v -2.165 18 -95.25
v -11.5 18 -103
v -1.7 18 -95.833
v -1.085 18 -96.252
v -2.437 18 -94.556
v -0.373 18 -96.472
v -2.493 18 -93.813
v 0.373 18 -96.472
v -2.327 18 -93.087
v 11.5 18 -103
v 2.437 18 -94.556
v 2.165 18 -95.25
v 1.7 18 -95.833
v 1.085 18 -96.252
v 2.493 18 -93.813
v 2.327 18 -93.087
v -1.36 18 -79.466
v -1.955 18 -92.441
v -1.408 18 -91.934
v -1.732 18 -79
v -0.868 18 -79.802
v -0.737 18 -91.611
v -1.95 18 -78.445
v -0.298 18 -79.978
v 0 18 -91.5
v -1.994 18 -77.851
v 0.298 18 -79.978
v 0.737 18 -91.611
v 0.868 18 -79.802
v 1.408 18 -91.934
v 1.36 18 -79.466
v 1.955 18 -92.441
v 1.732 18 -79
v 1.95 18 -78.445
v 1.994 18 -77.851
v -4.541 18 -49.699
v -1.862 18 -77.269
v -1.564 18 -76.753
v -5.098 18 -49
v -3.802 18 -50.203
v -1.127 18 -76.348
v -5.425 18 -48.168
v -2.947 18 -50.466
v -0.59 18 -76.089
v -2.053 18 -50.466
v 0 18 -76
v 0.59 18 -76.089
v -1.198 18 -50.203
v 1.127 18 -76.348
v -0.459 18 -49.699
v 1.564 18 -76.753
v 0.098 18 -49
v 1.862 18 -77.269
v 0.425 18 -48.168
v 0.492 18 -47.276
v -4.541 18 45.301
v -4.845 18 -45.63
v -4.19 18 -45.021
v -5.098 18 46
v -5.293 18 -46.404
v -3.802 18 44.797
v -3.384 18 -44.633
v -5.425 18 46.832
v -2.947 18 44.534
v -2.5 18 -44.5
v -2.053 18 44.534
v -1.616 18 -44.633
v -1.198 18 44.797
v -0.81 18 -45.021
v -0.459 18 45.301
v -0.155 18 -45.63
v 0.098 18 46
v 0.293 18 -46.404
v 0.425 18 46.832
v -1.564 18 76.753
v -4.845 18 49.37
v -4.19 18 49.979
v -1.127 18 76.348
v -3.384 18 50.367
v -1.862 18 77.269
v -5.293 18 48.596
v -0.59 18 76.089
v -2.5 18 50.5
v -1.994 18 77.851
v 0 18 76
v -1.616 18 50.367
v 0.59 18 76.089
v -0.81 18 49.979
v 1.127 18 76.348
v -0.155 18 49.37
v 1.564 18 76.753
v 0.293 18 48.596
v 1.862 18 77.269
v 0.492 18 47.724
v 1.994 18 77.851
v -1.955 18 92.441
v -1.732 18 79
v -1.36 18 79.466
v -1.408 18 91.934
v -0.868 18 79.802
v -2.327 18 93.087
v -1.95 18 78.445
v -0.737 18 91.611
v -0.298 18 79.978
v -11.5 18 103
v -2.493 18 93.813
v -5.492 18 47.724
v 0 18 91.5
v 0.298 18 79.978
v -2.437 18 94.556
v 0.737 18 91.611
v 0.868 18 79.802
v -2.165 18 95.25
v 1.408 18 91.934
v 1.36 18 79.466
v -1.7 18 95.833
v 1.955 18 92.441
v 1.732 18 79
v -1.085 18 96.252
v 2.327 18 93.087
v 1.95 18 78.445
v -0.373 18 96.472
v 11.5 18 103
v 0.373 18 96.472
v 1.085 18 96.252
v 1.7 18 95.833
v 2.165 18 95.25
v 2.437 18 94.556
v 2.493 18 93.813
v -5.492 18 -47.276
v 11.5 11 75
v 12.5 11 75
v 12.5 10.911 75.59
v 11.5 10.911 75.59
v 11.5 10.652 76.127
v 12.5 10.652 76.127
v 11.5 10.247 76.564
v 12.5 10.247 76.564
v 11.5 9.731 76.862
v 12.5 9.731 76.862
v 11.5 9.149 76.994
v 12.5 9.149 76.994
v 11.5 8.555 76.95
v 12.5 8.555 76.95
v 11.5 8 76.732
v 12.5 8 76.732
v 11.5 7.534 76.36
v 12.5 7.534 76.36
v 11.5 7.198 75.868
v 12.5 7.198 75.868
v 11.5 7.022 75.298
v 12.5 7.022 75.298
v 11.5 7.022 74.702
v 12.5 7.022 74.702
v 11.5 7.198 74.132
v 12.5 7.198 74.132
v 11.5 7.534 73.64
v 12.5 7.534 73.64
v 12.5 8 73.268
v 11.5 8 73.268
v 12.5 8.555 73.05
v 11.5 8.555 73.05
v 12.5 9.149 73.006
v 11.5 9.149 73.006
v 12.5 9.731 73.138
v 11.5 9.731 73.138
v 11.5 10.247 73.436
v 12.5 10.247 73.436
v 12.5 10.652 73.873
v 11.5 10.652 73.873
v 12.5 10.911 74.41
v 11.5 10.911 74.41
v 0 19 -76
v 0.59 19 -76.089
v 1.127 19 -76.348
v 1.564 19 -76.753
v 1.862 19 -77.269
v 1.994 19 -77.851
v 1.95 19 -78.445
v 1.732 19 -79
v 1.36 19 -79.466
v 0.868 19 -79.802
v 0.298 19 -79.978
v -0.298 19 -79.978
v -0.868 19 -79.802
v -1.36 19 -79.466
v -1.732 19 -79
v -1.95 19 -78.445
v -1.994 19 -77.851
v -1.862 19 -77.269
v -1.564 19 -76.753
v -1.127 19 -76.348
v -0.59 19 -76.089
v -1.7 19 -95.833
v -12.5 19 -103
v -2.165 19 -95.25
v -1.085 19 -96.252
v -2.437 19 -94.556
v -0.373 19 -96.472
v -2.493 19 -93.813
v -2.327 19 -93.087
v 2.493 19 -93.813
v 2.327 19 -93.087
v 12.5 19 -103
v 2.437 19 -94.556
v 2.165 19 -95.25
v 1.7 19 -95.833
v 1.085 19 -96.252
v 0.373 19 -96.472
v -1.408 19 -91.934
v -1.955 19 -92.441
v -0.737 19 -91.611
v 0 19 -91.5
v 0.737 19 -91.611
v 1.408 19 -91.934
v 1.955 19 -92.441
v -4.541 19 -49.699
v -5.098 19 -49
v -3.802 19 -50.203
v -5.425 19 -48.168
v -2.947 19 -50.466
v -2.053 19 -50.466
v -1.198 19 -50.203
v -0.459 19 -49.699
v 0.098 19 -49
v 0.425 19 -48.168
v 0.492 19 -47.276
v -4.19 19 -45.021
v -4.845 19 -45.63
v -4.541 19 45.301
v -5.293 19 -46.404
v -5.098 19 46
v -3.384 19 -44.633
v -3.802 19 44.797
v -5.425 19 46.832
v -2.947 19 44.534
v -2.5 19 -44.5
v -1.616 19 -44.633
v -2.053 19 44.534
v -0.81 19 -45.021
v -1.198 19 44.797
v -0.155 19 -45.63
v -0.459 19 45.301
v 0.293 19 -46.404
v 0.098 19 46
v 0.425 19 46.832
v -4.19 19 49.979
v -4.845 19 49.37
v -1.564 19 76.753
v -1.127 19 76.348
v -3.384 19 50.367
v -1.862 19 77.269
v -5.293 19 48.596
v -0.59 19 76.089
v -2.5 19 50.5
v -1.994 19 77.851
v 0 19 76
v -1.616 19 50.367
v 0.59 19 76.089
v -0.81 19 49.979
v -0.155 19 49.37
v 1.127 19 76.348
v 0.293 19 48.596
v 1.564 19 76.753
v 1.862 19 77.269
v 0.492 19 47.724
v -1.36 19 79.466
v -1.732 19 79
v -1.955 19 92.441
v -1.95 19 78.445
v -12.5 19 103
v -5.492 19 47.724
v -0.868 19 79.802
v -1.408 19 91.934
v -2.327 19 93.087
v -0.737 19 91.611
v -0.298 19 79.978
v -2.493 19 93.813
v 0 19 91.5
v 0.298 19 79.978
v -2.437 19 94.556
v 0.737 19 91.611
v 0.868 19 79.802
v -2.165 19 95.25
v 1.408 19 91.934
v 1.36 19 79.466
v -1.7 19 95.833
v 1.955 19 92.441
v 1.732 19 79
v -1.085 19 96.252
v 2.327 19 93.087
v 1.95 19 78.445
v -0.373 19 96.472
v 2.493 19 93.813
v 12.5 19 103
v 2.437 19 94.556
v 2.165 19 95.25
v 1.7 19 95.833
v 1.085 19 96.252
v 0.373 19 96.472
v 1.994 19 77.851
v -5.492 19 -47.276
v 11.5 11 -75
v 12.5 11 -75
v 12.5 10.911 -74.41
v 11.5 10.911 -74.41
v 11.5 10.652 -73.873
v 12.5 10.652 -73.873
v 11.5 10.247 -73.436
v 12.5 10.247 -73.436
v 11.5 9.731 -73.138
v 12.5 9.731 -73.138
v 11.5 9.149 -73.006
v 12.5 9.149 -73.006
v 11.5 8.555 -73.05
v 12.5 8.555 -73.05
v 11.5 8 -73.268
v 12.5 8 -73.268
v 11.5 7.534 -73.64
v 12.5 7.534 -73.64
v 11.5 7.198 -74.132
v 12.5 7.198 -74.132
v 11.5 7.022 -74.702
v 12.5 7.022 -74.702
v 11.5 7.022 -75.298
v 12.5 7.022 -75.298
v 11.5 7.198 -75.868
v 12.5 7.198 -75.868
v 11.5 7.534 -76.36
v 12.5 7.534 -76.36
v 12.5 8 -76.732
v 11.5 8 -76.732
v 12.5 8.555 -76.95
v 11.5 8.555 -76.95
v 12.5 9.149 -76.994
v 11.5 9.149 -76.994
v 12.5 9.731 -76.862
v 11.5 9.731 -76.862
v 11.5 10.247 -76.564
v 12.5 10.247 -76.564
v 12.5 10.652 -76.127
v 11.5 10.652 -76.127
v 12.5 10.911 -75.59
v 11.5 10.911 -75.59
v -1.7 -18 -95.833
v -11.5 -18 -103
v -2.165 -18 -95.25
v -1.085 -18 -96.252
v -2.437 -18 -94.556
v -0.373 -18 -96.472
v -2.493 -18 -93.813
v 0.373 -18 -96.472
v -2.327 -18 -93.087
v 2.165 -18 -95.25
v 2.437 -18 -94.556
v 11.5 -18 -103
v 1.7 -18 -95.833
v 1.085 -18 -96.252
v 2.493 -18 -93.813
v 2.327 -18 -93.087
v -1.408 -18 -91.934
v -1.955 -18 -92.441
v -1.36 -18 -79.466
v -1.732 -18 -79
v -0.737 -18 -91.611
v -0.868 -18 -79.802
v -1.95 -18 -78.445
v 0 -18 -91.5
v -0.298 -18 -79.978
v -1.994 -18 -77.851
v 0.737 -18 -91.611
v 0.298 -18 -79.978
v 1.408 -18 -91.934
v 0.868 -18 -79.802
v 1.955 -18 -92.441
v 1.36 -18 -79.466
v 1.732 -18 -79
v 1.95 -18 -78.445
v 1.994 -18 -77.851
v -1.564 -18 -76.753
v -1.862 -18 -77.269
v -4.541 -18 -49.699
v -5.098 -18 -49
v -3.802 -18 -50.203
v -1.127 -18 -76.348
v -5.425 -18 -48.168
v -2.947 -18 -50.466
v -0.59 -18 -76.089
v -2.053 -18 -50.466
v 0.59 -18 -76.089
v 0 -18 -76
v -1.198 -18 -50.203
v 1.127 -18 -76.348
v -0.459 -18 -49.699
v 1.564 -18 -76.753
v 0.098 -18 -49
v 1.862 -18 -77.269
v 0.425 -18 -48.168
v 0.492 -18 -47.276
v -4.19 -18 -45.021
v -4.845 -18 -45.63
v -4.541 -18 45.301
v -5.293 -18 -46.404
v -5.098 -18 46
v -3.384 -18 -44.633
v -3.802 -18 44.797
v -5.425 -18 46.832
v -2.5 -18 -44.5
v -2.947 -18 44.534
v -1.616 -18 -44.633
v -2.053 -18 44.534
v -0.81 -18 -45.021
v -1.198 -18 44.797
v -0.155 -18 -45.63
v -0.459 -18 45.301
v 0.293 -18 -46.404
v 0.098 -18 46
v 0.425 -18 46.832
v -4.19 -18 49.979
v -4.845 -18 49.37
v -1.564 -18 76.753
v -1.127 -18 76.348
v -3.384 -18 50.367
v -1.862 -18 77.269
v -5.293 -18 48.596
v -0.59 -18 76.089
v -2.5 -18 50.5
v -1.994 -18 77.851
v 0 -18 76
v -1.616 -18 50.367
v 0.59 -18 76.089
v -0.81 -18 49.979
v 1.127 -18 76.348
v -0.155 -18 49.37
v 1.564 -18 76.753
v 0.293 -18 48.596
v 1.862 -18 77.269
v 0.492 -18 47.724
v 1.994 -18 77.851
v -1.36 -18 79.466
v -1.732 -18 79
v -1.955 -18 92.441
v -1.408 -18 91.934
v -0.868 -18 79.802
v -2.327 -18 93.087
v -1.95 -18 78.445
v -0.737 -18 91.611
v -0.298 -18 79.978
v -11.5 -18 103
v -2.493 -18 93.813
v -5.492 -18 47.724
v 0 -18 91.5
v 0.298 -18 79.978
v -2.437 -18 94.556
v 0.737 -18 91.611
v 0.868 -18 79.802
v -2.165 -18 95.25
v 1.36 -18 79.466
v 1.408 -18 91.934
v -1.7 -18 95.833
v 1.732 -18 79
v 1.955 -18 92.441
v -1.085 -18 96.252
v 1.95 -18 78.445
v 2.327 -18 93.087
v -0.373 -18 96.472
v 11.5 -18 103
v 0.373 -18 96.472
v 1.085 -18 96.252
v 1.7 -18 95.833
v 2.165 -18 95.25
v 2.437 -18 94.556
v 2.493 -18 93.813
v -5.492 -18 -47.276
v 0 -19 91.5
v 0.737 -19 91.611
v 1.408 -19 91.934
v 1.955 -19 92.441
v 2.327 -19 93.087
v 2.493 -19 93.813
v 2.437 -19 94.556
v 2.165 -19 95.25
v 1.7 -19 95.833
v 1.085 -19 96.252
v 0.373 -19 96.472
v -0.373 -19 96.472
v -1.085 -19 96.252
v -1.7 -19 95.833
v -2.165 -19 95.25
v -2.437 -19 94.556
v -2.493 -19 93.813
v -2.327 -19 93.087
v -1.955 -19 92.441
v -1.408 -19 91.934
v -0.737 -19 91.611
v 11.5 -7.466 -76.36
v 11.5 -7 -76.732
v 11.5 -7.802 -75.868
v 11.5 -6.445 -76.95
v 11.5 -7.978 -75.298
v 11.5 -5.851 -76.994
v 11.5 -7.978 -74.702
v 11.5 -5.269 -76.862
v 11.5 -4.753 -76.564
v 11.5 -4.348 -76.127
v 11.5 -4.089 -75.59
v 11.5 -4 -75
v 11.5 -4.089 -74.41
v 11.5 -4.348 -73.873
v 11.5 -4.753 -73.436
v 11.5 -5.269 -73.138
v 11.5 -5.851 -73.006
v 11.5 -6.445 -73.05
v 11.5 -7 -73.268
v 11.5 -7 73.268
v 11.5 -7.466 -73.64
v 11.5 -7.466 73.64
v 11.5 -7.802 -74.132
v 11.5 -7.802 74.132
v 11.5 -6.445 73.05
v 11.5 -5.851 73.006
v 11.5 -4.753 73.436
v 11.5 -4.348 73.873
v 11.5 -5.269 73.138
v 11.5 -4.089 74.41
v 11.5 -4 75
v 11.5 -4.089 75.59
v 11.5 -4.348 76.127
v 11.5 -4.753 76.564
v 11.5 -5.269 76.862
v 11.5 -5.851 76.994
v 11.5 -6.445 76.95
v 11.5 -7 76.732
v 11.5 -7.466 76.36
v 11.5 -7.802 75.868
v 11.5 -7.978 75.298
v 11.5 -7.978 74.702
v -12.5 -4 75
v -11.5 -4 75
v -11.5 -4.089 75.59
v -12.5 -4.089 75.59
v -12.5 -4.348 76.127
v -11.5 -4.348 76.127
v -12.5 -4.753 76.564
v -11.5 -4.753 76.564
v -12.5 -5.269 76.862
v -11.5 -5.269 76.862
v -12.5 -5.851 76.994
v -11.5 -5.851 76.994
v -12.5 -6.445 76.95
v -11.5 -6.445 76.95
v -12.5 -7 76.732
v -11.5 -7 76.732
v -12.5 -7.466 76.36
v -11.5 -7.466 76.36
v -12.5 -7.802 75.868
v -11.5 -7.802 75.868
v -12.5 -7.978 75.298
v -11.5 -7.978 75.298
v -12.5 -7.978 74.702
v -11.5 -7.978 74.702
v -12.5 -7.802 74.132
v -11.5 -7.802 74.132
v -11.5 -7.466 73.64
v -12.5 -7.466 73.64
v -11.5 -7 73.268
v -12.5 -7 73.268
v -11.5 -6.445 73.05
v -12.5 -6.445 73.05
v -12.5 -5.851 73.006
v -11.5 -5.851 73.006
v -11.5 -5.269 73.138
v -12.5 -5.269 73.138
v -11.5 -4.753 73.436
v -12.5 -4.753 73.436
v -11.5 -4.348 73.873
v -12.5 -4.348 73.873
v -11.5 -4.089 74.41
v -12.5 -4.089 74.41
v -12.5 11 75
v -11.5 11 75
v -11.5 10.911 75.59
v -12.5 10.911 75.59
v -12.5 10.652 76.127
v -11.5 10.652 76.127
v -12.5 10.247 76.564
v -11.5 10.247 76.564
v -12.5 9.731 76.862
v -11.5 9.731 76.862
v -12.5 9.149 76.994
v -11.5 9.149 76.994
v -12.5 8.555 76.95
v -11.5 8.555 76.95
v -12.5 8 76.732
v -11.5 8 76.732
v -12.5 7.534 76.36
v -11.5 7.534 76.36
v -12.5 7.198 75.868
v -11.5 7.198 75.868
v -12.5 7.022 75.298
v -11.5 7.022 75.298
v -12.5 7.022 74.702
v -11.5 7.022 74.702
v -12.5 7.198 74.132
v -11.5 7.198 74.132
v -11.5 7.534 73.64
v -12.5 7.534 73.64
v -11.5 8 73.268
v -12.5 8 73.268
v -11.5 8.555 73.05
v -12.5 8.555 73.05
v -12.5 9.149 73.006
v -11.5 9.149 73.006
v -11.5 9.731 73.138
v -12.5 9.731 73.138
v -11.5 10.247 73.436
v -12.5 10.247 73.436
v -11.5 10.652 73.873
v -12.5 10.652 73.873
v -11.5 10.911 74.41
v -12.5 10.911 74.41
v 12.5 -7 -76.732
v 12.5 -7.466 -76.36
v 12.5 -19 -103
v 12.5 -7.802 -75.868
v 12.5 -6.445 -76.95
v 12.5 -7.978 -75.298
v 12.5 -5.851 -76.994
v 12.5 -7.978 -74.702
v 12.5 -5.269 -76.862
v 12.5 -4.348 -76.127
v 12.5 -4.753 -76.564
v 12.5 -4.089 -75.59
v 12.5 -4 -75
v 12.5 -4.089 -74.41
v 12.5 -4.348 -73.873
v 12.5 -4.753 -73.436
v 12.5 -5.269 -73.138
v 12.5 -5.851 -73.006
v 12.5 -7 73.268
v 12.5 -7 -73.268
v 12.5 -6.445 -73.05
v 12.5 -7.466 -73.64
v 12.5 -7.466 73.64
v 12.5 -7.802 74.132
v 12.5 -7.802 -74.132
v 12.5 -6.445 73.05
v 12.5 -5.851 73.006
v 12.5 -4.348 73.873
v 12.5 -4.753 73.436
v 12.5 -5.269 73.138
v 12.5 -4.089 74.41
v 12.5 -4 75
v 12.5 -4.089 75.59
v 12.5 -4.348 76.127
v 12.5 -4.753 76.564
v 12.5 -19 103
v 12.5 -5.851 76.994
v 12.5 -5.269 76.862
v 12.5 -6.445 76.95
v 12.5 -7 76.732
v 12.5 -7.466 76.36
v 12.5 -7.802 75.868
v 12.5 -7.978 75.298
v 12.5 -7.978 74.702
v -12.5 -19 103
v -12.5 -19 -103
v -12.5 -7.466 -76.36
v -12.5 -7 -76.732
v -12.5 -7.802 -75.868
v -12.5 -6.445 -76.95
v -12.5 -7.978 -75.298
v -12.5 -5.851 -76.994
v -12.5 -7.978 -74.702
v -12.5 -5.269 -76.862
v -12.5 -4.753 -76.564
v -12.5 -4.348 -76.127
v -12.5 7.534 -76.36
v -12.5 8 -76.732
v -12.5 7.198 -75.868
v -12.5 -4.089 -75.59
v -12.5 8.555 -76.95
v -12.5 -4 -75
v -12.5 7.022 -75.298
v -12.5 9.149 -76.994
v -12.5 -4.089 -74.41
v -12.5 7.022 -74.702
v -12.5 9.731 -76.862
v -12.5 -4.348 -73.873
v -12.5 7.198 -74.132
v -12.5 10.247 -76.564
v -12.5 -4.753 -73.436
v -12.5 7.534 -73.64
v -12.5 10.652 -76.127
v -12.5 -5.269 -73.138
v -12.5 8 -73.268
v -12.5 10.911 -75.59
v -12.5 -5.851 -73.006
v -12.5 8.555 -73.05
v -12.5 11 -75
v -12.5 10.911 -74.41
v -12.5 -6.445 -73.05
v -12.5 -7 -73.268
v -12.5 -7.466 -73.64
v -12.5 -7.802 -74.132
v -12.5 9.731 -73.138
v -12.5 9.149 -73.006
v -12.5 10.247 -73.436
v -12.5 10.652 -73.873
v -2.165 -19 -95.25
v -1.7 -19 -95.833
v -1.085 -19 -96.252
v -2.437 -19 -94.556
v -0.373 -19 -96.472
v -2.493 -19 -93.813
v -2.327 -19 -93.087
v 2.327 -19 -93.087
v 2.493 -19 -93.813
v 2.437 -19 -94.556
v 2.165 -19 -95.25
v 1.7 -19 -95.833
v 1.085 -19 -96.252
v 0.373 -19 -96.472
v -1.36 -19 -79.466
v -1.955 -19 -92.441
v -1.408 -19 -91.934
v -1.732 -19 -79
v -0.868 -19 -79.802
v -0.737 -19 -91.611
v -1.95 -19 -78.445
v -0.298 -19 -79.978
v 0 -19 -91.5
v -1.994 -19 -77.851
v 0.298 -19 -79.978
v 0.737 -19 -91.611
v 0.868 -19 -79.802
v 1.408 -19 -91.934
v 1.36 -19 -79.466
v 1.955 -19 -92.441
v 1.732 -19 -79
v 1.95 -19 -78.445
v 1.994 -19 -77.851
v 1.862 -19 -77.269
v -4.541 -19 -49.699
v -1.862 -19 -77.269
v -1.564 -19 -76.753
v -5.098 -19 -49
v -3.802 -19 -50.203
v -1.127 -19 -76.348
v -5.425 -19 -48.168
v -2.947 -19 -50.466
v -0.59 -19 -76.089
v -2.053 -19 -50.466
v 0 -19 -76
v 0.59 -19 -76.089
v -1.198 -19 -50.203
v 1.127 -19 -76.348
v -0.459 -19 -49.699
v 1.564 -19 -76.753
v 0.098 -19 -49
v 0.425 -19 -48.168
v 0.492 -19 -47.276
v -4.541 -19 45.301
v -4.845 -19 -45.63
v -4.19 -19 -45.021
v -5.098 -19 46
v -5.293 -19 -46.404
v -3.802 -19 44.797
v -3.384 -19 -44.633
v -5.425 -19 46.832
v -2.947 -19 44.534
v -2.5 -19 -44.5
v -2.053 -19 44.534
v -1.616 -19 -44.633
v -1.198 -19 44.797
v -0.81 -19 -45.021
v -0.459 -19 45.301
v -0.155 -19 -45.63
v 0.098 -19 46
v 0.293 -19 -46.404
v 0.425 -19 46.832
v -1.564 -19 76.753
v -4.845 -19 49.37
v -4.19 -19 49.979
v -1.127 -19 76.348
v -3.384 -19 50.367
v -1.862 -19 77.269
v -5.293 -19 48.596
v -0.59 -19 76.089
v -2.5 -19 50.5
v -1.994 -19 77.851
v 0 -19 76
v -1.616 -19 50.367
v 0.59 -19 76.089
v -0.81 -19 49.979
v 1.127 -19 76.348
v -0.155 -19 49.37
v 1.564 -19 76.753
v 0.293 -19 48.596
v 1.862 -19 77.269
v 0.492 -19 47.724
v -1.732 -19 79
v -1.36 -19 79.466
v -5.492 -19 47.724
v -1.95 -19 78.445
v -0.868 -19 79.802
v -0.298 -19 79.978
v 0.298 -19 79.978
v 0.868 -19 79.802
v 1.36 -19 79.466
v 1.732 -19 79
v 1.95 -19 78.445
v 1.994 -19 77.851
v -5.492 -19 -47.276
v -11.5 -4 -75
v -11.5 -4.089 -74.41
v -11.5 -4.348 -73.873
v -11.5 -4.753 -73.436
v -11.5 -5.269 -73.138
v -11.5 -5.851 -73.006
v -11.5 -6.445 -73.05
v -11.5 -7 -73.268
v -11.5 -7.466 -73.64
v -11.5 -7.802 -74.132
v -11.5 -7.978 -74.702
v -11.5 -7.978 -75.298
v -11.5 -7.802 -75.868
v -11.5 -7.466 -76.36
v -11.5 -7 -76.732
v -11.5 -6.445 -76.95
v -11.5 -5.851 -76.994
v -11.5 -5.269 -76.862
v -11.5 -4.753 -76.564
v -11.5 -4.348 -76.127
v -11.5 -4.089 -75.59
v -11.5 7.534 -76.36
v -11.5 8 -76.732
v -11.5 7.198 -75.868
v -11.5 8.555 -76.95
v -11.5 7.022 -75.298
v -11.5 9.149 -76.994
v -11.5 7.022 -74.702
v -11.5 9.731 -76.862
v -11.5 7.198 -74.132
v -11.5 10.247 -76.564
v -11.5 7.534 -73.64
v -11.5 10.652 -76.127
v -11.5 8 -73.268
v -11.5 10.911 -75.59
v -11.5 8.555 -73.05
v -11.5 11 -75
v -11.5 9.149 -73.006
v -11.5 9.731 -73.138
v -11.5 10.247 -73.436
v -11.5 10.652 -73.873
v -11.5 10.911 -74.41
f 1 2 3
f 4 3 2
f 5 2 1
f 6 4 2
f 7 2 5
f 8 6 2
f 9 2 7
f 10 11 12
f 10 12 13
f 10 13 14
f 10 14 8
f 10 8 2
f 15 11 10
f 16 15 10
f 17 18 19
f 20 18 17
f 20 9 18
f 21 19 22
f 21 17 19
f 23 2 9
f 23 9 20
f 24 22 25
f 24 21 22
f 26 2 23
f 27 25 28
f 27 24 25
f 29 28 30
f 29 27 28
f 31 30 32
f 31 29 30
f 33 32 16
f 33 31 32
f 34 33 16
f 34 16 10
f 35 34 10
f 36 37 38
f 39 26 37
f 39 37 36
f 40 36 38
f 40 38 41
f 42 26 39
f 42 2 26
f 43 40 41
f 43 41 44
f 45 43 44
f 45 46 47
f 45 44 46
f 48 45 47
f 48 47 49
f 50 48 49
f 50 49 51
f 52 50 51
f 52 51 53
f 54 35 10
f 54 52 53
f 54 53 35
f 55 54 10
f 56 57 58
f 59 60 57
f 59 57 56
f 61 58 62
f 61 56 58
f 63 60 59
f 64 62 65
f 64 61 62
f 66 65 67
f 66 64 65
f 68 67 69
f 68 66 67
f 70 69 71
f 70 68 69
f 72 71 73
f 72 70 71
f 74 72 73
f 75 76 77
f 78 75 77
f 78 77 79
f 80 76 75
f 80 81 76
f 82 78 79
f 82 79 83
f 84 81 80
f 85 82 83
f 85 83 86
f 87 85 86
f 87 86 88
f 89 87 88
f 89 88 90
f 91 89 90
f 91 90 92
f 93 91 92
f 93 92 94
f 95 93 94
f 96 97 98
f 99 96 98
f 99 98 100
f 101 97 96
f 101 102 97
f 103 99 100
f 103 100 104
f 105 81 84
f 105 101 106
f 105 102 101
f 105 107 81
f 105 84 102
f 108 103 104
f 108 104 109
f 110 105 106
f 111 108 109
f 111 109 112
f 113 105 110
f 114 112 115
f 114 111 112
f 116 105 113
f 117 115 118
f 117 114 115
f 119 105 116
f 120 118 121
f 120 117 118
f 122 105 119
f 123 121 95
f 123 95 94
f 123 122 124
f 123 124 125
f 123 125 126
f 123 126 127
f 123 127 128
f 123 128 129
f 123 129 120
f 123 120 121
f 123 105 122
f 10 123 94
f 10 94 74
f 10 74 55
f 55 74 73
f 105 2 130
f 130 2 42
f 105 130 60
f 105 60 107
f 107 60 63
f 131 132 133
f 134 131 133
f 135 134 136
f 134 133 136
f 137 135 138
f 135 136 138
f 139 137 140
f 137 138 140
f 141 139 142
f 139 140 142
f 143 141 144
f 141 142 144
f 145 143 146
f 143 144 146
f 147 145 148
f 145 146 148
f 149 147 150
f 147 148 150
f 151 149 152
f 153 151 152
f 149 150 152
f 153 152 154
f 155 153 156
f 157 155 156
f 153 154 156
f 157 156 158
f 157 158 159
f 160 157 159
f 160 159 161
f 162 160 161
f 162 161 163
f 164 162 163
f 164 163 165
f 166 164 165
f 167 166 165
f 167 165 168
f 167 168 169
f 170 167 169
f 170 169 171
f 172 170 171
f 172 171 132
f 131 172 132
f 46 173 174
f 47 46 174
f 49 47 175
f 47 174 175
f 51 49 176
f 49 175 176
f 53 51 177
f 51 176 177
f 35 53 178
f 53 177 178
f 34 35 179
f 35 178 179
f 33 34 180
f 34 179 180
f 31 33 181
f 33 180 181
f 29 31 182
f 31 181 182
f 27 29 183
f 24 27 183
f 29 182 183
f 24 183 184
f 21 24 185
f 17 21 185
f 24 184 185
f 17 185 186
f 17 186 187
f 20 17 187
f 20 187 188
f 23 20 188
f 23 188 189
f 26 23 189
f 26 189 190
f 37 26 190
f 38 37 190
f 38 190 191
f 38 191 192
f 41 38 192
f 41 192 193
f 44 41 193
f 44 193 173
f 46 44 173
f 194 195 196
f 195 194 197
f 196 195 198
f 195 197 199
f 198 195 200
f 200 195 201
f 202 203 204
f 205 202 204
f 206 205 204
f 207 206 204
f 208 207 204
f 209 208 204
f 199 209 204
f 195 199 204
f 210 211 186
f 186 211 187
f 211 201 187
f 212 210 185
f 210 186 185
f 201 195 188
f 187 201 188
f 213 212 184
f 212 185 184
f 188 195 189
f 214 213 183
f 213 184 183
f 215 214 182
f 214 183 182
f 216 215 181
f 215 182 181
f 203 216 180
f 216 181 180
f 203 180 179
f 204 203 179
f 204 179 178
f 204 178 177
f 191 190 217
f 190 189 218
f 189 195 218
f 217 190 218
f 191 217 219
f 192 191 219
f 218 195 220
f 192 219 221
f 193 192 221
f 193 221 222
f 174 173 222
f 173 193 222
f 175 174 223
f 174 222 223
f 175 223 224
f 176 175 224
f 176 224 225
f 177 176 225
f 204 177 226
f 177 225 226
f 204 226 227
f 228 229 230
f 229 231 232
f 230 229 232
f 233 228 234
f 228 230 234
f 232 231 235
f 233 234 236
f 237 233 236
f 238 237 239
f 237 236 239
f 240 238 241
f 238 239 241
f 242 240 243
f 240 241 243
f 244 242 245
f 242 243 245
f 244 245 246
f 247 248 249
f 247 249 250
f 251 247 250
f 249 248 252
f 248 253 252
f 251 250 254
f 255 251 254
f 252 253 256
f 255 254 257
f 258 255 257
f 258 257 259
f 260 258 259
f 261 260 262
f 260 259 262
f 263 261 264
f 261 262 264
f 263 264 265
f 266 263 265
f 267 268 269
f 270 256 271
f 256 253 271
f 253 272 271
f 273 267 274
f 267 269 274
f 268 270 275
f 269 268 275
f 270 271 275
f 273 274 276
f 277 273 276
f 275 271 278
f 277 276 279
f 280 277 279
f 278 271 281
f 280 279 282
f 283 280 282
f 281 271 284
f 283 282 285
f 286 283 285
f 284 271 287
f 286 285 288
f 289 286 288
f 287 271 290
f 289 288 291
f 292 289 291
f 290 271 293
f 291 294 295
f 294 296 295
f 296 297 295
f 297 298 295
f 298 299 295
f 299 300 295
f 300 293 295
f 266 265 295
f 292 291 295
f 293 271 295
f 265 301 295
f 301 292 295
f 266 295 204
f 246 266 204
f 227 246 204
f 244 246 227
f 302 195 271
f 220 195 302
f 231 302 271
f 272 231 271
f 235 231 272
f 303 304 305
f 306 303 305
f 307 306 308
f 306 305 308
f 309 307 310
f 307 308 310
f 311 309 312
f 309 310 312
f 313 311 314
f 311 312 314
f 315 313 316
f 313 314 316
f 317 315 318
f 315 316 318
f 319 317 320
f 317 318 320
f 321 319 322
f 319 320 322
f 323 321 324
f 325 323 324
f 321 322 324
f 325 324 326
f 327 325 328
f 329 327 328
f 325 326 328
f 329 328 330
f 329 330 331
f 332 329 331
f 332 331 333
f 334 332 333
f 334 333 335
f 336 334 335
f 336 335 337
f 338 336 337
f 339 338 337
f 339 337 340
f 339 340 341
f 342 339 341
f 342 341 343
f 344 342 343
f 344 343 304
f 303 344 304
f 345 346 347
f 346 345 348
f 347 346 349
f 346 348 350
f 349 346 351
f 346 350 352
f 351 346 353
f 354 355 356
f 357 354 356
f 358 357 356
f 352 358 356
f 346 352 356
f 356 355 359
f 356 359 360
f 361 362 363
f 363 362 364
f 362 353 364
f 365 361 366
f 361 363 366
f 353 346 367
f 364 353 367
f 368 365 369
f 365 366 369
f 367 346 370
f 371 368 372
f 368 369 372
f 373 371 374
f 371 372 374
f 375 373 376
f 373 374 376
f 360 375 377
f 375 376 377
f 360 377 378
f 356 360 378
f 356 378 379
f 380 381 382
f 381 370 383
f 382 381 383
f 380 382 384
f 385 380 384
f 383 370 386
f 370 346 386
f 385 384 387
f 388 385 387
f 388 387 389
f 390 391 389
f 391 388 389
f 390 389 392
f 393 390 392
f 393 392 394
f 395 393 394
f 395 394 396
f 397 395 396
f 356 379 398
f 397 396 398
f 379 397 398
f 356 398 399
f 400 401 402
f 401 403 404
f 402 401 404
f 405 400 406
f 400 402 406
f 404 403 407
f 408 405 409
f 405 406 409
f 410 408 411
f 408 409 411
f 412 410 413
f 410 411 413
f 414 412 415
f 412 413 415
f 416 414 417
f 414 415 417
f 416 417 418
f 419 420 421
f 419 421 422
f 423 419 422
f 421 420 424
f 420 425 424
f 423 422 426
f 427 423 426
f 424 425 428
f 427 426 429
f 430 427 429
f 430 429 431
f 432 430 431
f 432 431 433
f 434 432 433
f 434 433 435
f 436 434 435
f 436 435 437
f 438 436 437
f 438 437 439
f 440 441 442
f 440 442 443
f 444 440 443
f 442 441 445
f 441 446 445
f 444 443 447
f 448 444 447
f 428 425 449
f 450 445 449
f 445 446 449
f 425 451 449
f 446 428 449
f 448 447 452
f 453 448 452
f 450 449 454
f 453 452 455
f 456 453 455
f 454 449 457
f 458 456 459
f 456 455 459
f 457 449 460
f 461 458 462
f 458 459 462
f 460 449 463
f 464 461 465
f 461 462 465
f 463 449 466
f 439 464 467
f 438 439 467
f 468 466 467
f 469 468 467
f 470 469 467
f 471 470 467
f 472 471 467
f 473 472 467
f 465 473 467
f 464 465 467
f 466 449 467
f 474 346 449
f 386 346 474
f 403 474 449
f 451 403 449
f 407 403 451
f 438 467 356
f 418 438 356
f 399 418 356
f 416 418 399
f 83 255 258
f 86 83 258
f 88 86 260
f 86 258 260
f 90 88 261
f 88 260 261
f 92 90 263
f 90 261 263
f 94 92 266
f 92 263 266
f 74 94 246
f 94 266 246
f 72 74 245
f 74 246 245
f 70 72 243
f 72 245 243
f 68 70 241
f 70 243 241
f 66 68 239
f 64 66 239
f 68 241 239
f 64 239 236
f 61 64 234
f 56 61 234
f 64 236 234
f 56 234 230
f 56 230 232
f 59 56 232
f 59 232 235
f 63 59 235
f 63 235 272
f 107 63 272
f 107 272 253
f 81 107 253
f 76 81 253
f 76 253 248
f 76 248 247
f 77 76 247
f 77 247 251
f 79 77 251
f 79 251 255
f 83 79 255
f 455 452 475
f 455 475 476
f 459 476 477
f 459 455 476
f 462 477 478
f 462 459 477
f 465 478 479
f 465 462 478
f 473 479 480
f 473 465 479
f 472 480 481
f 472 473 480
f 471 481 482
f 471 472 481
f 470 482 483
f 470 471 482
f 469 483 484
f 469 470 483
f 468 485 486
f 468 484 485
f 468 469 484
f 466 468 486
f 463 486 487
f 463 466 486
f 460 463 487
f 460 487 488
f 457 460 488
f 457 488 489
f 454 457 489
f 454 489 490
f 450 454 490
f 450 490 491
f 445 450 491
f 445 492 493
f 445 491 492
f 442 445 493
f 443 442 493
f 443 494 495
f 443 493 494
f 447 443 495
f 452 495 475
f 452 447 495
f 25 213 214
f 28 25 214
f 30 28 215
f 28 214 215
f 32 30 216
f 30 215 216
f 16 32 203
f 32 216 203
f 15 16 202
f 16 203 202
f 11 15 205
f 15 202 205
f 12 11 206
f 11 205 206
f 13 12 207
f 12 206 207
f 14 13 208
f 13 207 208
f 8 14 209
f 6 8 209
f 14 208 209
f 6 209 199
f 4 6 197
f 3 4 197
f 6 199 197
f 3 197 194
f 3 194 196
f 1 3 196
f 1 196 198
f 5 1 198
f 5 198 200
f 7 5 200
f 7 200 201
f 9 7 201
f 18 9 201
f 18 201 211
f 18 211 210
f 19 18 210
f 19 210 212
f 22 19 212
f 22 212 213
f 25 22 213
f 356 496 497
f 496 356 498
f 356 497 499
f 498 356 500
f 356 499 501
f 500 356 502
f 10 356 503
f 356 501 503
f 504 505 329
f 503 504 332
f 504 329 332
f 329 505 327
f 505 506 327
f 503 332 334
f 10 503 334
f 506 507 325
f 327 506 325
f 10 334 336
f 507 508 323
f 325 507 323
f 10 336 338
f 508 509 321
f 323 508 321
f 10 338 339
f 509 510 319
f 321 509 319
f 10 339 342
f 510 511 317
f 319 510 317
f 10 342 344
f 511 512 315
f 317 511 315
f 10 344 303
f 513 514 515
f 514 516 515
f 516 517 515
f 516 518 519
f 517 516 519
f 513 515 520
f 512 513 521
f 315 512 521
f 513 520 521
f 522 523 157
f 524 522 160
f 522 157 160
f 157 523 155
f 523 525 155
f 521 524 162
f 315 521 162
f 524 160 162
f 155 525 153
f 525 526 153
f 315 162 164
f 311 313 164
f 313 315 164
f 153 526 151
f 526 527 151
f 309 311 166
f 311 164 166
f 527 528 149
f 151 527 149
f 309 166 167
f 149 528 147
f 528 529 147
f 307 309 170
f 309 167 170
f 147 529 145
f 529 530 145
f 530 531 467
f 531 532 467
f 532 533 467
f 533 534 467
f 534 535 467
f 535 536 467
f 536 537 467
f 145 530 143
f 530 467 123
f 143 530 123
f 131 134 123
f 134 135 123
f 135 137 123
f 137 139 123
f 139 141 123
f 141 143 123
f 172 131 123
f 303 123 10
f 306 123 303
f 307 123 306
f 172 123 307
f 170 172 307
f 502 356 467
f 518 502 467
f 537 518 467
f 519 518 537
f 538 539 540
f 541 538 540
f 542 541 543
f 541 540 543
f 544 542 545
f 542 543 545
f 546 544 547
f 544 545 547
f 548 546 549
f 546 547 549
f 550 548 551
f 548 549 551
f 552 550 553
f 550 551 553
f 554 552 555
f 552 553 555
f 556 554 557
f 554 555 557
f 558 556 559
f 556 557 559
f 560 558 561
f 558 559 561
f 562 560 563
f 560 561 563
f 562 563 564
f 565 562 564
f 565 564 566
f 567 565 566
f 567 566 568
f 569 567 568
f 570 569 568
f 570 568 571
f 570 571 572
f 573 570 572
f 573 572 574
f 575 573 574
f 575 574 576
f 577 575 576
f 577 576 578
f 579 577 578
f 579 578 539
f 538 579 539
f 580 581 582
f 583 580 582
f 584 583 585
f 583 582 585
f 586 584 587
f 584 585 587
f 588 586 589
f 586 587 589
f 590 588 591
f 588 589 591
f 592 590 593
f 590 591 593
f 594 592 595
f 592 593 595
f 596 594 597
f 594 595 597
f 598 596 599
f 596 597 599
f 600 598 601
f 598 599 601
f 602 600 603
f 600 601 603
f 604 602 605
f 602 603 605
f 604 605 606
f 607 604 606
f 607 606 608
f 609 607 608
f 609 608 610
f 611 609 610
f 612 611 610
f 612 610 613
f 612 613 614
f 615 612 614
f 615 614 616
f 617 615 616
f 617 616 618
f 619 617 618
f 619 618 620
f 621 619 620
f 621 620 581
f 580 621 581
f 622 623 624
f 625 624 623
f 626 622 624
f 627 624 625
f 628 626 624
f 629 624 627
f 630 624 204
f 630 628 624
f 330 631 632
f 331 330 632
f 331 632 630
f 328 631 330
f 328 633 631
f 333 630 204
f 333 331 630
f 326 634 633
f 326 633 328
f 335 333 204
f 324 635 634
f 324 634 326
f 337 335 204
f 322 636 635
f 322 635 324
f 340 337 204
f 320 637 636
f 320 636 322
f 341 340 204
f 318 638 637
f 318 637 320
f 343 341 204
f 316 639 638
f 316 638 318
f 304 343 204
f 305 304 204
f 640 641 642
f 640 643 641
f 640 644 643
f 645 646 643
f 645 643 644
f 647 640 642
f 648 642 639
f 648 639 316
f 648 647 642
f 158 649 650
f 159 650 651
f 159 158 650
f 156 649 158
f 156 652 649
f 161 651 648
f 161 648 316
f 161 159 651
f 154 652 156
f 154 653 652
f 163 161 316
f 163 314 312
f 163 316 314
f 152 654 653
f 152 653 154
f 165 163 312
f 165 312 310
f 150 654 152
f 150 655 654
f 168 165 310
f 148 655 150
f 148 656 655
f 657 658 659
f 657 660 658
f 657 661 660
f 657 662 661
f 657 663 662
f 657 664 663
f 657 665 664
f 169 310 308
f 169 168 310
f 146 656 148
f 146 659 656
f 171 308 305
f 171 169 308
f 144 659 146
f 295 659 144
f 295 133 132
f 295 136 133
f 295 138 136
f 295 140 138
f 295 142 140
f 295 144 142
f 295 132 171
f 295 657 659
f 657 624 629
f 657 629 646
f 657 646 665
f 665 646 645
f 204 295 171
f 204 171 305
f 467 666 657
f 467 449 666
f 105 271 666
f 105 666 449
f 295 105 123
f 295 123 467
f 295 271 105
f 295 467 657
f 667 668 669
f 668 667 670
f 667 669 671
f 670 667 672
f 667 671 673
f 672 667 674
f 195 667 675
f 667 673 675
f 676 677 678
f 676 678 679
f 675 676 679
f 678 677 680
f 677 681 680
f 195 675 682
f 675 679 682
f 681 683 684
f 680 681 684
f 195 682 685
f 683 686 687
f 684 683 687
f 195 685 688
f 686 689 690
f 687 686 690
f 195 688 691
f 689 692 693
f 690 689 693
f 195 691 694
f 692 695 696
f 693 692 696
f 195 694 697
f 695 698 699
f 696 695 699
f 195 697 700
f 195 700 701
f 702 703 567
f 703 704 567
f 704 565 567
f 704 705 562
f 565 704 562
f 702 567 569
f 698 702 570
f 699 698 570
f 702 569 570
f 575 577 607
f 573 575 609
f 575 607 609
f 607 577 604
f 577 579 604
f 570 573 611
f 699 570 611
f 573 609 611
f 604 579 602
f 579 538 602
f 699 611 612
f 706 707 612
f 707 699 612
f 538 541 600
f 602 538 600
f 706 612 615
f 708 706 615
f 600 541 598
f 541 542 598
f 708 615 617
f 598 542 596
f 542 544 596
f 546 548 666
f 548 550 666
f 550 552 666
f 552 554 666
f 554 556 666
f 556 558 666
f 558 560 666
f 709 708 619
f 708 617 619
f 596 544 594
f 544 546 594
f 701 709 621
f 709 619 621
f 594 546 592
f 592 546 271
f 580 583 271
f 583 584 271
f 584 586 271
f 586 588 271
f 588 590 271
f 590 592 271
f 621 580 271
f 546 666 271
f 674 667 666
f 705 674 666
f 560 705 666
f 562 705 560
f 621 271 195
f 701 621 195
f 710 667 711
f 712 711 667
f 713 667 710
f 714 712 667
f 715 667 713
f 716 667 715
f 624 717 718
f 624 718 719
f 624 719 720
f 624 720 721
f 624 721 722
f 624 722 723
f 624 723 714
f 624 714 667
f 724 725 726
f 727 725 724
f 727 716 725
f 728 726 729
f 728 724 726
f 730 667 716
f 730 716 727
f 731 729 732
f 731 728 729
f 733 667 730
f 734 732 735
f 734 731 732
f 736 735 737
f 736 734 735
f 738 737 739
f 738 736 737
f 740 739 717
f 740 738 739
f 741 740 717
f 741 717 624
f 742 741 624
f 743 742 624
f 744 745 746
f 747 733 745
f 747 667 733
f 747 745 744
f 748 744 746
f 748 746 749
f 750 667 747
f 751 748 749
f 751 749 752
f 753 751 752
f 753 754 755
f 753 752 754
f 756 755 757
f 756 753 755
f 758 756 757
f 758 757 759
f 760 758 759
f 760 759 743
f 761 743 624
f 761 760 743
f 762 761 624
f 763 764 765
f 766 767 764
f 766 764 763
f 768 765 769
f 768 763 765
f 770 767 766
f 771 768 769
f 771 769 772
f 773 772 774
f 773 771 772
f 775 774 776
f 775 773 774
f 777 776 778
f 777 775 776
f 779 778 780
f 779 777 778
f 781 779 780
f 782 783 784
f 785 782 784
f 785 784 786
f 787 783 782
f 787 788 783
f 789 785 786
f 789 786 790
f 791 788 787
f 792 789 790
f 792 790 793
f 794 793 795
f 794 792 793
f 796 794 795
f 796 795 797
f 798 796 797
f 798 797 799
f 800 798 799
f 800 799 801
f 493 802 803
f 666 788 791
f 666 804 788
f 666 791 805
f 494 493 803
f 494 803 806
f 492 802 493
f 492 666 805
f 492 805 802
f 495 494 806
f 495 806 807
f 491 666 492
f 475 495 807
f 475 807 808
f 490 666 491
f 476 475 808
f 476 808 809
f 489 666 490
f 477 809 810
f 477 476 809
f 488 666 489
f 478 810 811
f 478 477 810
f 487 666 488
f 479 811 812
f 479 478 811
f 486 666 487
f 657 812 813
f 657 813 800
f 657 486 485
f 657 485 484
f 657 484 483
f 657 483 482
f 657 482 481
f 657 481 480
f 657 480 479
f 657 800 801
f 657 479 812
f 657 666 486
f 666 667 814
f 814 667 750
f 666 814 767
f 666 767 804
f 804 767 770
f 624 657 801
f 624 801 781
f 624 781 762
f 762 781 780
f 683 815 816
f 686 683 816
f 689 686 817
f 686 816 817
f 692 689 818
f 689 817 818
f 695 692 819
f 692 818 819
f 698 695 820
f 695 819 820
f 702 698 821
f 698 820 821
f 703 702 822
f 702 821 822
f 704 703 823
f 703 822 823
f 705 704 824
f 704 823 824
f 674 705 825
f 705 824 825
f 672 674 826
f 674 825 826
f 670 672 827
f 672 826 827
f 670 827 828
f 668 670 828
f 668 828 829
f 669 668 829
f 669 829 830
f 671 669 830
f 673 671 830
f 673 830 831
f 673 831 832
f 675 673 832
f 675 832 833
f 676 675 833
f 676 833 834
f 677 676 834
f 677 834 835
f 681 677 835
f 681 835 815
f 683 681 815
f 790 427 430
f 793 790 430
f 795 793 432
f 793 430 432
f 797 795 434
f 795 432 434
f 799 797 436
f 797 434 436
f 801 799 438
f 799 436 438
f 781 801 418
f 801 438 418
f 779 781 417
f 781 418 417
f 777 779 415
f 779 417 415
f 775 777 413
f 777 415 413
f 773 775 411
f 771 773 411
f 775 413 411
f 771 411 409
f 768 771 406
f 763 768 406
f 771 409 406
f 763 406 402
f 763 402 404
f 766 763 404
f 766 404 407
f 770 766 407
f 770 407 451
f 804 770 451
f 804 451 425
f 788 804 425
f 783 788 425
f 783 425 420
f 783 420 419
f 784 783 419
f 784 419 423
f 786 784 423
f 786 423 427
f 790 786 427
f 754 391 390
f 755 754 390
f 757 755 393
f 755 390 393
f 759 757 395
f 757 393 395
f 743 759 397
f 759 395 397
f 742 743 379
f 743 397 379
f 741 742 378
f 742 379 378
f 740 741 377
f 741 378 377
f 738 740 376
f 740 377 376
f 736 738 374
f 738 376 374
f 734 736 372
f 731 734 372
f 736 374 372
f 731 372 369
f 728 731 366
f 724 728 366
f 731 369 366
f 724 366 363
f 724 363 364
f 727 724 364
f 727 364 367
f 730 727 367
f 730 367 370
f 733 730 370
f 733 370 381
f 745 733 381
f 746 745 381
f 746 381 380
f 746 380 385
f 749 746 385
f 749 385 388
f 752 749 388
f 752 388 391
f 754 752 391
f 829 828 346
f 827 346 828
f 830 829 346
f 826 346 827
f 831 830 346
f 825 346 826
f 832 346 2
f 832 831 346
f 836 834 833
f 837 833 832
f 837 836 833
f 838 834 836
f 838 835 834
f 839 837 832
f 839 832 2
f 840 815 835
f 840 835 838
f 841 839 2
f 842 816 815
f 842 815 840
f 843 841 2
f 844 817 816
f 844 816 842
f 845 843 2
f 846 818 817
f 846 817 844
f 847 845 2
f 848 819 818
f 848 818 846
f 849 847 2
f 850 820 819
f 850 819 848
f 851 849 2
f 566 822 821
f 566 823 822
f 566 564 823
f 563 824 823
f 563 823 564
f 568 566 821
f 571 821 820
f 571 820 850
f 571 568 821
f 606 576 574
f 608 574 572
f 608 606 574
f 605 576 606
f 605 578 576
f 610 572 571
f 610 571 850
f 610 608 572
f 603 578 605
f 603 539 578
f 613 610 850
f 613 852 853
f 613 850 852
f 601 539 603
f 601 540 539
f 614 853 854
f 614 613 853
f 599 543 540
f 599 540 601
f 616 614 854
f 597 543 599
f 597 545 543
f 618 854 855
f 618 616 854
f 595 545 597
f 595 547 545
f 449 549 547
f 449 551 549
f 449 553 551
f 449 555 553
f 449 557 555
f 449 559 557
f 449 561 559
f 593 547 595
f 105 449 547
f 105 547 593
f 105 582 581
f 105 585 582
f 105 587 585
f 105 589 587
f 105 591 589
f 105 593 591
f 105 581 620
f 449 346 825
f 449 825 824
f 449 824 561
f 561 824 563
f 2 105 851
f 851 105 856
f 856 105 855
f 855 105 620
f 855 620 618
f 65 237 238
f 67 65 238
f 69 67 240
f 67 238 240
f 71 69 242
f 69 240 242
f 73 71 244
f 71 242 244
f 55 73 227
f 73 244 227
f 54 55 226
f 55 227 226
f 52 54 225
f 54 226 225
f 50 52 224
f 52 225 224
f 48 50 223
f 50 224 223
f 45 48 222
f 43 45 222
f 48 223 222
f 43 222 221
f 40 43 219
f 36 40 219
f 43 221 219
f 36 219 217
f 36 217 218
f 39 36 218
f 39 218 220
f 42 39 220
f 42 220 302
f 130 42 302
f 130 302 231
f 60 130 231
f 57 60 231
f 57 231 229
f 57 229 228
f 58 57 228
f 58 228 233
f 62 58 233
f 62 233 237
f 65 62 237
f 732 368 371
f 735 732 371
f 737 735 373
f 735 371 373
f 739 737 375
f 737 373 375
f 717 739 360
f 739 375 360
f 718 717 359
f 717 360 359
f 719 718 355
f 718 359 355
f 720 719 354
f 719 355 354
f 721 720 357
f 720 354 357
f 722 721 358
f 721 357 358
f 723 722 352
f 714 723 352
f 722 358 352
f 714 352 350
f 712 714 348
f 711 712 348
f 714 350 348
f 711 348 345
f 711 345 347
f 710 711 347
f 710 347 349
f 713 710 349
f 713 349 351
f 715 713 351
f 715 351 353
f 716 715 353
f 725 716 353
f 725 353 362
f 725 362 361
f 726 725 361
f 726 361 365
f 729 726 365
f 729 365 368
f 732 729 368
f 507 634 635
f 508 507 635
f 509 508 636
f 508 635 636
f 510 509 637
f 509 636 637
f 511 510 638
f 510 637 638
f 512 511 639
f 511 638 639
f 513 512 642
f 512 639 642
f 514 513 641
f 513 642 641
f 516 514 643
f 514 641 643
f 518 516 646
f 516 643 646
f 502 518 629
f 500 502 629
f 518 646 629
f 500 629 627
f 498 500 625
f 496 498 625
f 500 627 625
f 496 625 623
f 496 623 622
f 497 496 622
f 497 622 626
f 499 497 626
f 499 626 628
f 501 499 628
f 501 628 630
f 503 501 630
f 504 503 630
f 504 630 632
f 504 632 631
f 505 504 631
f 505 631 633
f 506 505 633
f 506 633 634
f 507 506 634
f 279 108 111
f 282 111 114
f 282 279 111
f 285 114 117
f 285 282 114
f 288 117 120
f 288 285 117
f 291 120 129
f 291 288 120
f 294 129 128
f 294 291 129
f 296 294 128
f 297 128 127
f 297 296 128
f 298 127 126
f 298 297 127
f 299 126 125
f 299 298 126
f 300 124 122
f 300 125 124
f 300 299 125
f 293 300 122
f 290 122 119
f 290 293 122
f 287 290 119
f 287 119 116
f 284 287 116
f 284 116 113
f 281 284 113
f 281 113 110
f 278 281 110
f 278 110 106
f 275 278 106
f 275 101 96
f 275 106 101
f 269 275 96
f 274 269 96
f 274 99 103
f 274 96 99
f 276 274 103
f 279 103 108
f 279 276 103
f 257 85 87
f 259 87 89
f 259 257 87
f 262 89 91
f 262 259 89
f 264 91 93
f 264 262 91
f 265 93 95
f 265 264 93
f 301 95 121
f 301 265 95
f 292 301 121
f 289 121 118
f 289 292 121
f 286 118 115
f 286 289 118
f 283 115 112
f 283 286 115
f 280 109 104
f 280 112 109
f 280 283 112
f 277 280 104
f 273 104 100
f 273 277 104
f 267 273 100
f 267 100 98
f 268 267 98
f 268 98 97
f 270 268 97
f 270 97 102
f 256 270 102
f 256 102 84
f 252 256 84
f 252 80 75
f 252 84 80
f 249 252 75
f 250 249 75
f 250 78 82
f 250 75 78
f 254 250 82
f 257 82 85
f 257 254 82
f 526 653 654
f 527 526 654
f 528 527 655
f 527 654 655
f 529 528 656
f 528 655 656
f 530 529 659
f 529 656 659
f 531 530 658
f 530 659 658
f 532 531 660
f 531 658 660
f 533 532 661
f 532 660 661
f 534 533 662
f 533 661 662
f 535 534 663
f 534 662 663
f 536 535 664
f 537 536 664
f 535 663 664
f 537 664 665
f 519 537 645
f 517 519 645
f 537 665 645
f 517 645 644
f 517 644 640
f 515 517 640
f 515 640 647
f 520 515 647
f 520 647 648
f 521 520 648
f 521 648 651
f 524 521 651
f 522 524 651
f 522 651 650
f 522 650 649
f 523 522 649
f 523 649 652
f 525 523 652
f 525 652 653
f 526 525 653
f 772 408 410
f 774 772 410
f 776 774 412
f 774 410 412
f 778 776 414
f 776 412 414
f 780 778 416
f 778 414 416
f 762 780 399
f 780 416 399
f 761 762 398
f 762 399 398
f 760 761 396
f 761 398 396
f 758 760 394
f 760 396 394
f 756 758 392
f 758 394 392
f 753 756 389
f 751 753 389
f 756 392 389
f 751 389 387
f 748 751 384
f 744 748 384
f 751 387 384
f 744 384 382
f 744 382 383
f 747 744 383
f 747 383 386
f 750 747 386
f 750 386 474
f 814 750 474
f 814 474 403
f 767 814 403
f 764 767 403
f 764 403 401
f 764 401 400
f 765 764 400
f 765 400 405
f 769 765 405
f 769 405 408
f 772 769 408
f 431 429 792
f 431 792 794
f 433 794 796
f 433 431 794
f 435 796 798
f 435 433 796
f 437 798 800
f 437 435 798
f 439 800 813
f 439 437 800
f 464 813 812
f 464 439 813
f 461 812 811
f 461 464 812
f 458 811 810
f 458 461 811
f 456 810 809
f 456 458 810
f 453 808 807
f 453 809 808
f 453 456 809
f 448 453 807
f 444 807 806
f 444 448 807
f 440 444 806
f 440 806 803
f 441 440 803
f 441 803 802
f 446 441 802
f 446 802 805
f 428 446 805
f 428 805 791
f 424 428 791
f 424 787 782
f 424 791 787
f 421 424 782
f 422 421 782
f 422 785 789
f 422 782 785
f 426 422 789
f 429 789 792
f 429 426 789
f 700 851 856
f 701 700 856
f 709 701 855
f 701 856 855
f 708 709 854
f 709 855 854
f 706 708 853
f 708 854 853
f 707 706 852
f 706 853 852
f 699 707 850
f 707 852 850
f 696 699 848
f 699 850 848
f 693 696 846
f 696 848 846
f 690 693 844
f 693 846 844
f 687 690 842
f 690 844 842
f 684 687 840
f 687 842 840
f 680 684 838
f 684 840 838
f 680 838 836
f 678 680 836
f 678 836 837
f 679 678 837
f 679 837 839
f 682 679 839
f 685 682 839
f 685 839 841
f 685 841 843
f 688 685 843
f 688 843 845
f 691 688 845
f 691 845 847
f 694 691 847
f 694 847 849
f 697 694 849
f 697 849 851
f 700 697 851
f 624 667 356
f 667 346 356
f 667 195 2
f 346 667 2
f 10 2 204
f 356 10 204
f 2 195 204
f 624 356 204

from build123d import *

# Parameters (mm, degrees)
SKETCH_1_W          = 25
SKETCH_1_H          = 38
SKETCH_1_W_2        = 23
SKETCH_1_H_2        = 36
EXTRUDE_1_DEPTH     = 103
SKETCH_2_R          = 2.5
SKETCH_2_R_2        = 2
CUT_EXTRUDE_1_DEPTH = 40
SKETCH_4_R          = 3
CUT_EXTRUDE_2_DEPTH = 38
SKETCH_5_R          = 2
CUT_EXTRUDE_3_DEPTH = 108.680081724


with BuildPart() as part:
    # 草图1 → 凸台-拉伸1 (new, symmetric)
    with BuildSketch(Plane.XY):
        Rectangle(SKETCH_1_W, SKETCH_1_H)
        Rectangle(SKETCH_1_W_2, SKETCH_1_H_2, mode=Mode.SUBTRACT)
    extrude(amount=EXTRUDE_1_DEPTH, both=True)

    # 草图2 → 切除-拉伸1 (cut)
    with BuildSketch(Plane(origin=(0, 19, 0), x_dir=(1, 0, 0), z_dir=(0, 1, 0))):
        with Locations(Location((0, 94, 0), (0, 0, 270))):
            Circle(SKETCH_2_R)
        with Locations(Location((0, 78, 0), (0, 0, 270))):
            Circle(SKETCH_2_R_2)
    cut_extrude_1 = extrude(amount=-CUT_EXTRUDE_1_DEPTH, mode=Mode.SUBTRACT)

    # 镜向1: 切除-拉伸1 across plane
    add(cut_extrude_1.mirror(Plane.XY), mode=Mode.SUBTRACT)

    # 草图4 → 切除-拉伸2 (cut)
    with BuildSketch(Plane(origin=(0, 19, 0), x_dir=(1, 0, 0), z_dir=(0, 1, 0))):
        with Locations(Location((-2.5, 47.5, 0), (0, 0, 270))):
            Circle(SKETCH_4_R)
        with Locations(Location((-2.5, -47.5, 0), (0, 0, 270))):
            Circle(SKETCH_4_R)
    extrude(amount=-CUT_EXTRUDE_2_DEPTH, mode=Mode.SUBTRACT)

    # 草图5 → 切除-拉伸3 (cut, through all)
    with BuildSketch(Plane(origin=(12.5, 0, 0), x_dir=(0, 0, -1), z_dir=(1, 0, 0))):
        with Locations(Location((-75, 9, 0), (0, 0, 90))):
            Circle(SKETCH_5_R)
        with Locations(Location((-75, -6, 0), (0, 0, 90))):
            Circle(SKETCH_5_R)
        with Locations(Location((75, -6, 0), (0, 0, 90))):
            Circle(SKETCH_5_R)
        with Locations(Location((75, 9, 0), (0, 0, 90))):
            Circle(SKETCH_5_R)
    extrude(amount=-CUT_EXTRUDE_3_DEPTH, mode=Mode.SUBTRACT)


solid = part.part
